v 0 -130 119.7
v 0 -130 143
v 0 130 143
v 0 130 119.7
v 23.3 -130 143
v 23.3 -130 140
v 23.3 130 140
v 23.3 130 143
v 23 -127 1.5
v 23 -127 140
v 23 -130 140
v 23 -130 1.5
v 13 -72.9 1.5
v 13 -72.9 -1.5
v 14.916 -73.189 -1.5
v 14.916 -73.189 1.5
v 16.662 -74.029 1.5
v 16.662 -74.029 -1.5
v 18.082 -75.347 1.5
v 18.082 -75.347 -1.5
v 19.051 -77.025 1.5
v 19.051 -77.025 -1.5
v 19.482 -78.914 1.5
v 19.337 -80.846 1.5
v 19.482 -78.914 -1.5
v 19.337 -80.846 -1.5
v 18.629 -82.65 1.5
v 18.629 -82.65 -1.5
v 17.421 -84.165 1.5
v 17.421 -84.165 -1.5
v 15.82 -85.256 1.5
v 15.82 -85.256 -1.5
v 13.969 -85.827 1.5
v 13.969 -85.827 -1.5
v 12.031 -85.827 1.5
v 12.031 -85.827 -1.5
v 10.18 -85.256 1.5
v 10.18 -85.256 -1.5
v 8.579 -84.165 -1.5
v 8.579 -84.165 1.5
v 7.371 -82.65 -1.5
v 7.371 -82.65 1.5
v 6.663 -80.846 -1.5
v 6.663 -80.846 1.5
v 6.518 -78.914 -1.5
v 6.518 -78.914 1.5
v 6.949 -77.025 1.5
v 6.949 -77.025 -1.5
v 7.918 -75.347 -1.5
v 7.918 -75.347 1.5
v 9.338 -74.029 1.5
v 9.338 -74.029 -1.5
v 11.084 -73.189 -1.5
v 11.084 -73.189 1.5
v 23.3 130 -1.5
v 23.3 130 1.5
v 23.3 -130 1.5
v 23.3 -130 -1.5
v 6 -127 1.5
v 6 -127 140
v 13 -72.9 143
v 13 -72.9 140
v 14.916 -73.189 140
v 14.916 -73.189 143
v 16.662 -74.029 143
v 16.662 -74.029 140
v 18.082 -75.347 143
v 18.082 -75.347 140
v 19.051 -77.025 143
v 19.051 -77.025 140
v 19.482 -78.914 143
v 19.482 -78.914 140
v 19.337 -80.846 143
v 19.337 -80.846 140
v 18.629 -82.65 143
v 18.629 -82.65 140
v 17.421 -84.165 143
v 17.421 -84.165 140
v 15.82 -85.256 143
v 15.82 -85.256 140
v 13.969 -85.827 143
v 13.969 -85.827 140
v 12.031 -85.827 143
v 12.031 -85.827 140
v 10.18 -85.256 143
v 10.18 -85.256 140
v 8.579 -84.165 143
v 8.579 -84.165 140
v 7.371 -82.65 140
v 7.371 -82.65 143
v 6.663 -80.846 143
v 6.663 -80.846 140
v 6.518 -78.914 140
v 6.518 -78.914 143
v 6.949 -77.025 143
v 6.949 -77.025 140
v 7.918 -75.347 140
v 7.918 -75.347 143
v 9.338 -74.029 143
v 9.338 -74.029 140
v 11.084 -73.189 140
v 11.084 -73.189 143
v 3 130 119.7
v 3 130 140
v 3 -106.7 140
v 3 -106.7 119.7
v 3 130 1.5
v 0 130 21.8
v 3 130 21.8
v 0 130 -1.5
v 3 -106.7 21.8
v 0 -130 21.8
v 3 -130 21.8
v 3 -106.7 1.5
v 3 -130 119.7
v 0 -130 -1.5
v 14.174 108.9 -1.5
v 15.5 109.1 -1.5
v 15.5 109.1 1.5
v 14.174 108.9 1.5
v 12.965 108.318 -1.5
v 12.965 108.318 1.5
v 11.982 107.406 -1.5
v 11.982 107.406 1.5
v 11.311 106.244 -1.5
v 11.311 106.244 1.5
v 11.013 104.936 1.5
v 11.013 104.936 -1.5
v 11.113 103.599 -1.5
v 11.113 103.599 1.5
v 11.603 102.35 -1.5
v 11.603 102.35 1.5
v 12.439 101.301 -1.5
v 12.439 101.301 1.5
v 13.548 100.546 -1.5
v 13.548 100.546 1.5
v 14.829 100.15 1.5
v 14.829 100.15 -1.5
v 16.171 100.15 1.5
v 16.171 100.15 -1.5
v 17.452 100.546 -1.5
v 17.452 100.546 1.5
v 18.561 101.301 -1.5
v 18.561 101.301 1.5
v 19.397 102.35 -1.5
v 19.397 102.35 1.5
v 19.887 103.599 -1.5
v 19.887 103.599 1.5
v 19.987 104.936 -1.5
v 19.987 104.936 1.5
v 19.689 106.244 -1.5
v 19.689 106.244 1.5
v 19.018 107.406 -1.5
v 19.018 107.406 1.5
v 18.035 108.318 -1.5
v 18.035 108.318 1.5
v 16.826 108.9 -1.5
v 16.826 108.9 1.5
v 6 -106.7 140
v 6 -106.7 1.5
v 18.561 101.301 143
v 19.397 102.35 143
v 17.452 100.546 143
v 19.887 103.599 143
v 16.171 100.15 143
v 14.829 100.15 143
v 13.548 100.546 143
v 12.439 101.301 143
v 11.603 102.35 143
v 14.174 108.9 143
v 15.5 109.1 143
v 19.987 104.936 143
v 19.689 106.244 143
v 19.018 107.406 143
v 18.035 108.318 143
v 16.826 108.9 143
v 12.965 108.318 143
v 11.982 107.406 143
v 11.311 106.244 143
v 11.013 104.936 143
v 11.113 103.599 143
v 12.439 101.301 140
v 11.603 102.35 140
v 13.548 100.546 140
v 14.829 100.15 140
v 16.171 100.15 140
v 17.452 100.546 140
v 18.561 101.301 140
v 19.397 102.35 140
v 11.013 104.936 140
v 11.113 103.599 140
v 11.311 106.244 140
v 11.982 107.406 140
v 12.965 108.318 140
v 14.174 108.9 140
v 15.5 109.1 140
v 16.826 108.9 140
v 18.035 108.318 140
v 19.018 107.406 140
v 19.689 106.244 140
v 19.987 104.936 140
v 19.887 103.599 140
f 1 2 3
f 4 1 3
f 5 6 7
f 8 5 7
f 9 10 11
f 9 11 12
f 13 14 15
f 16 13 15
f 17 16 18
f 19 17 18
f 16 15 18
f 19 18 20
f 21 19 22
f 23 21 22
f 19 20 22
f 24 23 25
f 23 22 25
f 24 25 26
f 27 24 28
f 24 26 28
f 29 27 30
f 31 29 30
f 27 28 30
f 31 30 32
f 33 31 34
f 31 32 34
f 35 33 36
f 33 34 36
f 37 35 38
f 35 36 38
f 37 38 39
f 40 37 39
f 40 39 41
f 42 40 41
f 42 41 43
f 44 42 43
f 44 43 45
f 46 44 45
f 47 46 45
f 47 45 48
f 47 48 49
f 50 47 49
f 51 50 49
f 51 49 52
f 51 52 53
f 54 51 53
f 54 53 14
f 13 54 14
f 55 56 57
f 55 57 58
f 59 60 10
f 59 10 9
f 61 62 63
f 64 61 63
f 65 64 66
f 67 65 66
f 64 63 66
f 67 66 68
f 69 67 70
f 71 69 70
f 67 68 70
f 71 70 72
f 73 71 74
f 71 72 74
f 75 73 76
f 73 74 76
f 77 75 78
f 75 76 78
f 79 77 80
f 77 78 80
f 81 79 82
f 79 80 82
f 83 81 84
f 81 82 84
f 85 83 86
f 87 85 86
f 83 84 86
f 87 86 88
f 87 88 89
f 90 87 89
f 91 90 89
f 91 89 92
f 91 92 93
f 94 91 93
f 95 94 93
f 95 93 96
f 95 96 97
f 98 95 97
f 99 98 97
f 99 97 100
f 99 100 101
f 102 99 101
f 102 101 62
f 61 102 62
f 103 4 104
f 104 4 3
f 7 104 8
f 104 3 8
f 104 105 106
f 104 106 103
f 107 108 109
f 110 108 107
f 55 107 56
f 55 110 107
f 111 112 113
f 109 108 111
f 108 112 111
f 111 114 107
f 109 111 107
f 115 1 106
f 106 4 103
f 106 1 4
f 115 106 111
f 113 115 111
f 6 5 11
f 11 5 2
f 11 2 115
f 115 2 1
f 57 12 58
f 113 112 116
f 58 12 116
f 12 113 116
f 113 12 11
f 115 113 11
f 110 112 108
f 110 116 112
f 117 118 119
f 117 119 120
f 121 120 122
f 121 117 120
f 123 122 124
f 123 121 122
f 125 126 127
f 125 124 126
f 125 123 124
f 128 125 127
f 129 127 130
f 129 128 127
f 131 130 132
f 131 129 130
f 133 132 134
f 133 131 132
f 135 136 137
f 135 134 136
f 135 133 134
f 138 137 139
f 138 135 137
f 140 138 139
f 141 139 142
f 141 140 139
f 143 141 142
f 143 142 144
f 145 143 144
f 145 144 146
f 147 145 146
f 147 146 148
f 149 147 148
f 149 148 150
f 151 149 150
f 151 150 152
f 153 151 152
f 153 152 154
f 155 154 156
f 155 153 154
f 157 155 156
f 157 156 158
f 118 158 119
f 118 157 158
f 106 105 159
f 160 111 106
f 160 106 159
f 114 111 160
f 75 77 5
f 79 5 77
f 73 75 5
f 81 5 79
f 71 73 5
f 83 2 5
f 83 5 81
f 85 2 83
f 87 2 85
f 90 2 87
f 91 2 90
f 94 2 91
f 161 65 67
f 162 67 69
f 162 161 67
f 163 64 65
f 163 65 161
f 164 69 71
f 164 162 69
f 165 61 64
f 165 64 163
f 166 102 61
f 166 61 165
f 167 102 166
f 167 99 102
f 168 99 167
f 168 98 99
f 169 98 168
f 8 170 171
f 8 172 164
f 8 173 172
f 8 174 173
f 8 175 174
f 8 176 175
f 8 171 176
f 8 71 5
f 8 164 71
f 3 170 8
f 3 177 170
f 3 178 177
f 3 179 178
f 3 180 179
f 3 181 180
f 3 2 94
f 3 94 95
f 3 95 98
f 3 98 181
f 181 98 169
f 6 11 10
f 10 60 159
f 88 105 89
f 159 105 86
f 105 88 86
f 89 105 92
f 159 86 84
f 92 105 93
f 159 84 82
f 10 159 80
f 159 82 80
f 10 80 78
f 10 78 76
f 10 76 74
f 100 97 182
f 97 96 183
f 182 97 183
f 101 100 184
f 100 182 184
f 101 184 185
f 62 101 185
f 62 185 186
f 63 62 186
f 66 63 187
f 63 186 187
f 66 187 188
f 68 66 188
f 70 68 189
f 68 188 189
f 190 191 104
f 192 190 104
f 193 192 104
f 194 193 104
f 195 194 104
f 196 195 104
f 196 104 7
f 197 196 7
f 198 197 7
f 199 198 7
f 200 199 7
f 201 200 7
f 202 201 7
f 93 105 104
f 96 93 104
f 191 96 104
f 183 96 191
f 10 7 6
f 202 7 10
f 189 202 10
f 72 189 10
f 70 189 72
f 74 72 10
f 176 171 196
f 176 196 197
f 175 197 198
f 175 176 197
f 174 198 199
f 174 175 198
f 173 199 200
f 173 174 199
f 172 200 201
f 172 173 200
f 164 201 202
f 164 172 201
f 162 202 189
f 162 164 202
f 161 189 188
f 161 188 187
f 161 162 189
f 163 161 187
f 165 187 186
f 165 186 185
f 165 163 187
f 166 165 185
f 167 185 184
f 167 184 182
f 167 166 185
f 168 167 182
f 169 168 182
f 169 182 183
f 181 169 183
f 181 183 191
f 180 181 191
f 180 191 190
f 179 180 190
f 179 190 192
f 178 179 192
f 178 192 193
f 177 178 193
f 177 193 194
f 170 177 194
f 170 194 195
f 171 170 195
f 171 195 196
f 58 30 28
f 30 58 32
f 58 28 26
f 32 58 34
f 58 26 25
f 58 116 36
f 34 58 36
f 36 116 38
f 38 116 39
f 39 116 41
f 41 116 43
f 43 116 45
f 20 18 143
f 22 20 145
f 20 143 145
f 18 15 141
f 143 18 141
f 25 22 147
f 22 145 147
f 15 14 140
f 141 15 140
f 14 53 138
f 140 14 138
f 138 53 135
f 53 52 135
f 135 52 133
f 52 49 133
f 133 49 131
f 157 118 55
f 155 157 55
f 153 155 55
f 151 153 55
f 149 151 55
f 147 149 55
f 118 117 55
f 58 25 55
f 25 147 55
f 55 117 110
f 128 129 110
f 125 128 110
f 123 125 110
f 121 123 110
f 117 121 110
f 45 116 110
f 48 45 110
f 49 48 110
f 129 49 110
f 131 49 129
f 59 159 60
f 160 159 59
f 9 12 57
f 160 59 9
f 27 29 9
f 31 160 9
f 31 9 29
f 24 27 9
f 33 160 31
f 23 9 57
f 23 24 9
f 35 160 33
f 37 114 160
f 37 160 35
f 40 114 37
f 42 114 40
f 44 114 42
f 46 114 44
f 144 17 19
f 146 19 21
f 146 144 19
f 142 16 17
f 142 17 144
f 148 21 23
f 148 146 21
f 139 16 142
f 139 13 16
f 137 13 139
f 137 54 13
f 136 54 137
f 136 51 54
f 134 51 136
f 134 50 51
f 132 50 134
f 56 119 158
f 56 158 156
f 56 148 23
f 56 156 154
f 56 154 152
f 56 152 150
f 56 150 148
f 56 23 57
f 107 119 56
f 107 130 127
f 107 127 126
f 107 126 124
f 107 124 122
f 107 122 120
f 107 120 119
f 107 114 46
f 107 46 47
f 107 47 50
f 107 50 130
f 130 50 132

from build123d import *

# Parameters (mm, degrees)
SKETCH1_W               = 3
SKETCH1_H               = 260
BOSS_EXTRUDE1_DEPTH     = 3
SKETCH2_W               = 3
SKETCH2_H               = 260
BOSS_EXTRUDE2_DEPTH     = 20.3
CUT_EXTRUDE1_DEPTH      = 22.3
CUT_EXTRUDE1_DEPTH_BACK = 20.3
SKETCH3_R               = 4.5
SKETCH5_W               = 23.3
SKETCH5_H               = 260
BOSS_EXTRUDE3_DEPTH     = 3
SKETCH6_W               = 3
SKETCH6_H               = 260
BOSS_EXTRUDE4_DEPTH     = 23.3
SKETCH8_W               = 3
SKETCH8_H               = 260
BOSS_EXTRUDE5_DEPTH     = 20.3
SKETCH11_W              = 144.5
SKETCH11_H              = 23.3
BOSS_EXTRUDE6_DEPTH     = 3
SKETCH12_W              = 138.5
SKETCH12_H              = 3
BOSS_EXTRUDE7_DEPTH     = 17
SKETCH10_R              = 6.5
CUT_EXTRUDE3_DEPTH      = 156
CUT_EXTRUDE4_START      = -10
SKETCH7_R               = 4.5
CUT_EXTRUDE4_DEPTH      = 10


with BuildPart() as part:
    # Sketch1 → Boss-Extrude1 (new body)
    with BuildSketch(Plane(origin=(0, 0, 0), x_dir=(0, 0, -1), z_dir=(1, 0, 0))):
        Rectangle(SKETCH1_W, SKETCH1_H)
    extrude(amount=BOSS_EXTRUDE1_DEPTH)

    # Sketch2 → Boss-Extrude2 (add)
    with BuildSketch(Plane(origin=(3, 0, 0), x_dir=(0, 0, -1), z_dir=(1, 0, 0))):
        Rectangle(SKETCH2_W, SKETCH2_H)
    extrude(amount=BOSS_EXTRUDE2_DEPTH)

    # Sketch3 → Cut-Extrude1 (cut, two sides: drawn at the far end of the back side and taken through both)
    with BuildSketch(Plane.XY.offset(1.5).offset(-CUT_EXTRUDE1_DEPTH_BACK)):
        with Locations(Location((15.5, 104.6, 0), (0, 0, 90))):
            Circle(SKETCH3_R)
    extrude(amount=CUT_EXTRUDE1_DEPTH + CUT_EXTRUDE1_DEPTH_BACK, mode=Mode.SUBTRACT)

    # Sketch8 → Boss-Extrude5 (add)
    with BuildSketch(Plane.XY.offset(1.5)):
        with Locations((1.5, 0)):
            Rectangle(SKETCH8_W, SKETCH8_H)
    extrude(amount=BOSS_EXTRUDE5_DEPTH)



with BuildPart() as body_2:
    # Sketch5 → Boss-Extrude3 (new body)
    with BuildSketch(Plane.XY.offset(140)):
        with Locations((11.65, 0)):
            Rectangle(SKETCH5_W, SKETCH5_H)
    extrude(amount=BOSS_EXTRUDE3_DEPTH)

    # Sketch6 → Boss-Extrude4 (add)
    with BuildSketch(Plane.XY.offset(143)):
        with Locations((1.5, 0)):
            Rectangle(SKETCH6_W, SKETCH6_H)
    extrude(amount=-BOSS_EXTRUDE4_DEPTH)


with BuildPart() as part_1:
    add(part.part)

    add(body_2.part)  # Boss-Extrude6 merges body 2
    # Sketch11 → Boss-Extrude6 (add)
    with BuildSketch(Plane(origin=(3, 0, 0), x_dir=(0, 0, -1), z_dir=(1, 0, 0))):
        with Locations((-70.75, -118.35)):
            Rectangle(SKETCH11_W, SKETCH11_H)
    extrude(amount=BOSS_EXTRUDE6_DEPTH)

    # Sketch12 → Boss-Extrude7 (add)
    with BuildSketch(Plane(origin=(6, 0, 0), x_dir=(0, 0, -1), z_dir=(1, 0, 0))):
        with Locations((-70.75, -128.5)):
            Rectangle(SKETCH12_W, SKETCH12_H)
    extrude(amount=BOSS_EXTRUDE7_DEPTH)

    # Sketch10 → Cut-Extrude3 (cut)
    with BuildSketch(Plane(origin=(0, 0, -1.5), x_dir=(-1, 0, 0), z_dir=(0, 0, -1))):
        with Locations(Location((-13, -79.4, 0), (0, 0, 90))):
            Circle(SKETCH10_R)
    extrude(amount=-CUT_EXTRUDE3_DEPTH, mode=Mode.SUBTRACT)

    # Sketch7 → Cut-Extrude4 (cut)
    with BuildSketch(Plane(origin=(0, 0, 140), x_dir=(-1, 0, 0), z_dir=(0, 0, -1)).offset(CUT_EXTRUDE4_START)):
        with Locations(Location((-15.5, 104.6, 0), (0, 0, 90))):
            Circle(SKETCH7_R)
    extrude(amount=CUT_EXTRUDE4_DEPTH, mode=Mode.SUBTRACT)


solid = part_1.part
